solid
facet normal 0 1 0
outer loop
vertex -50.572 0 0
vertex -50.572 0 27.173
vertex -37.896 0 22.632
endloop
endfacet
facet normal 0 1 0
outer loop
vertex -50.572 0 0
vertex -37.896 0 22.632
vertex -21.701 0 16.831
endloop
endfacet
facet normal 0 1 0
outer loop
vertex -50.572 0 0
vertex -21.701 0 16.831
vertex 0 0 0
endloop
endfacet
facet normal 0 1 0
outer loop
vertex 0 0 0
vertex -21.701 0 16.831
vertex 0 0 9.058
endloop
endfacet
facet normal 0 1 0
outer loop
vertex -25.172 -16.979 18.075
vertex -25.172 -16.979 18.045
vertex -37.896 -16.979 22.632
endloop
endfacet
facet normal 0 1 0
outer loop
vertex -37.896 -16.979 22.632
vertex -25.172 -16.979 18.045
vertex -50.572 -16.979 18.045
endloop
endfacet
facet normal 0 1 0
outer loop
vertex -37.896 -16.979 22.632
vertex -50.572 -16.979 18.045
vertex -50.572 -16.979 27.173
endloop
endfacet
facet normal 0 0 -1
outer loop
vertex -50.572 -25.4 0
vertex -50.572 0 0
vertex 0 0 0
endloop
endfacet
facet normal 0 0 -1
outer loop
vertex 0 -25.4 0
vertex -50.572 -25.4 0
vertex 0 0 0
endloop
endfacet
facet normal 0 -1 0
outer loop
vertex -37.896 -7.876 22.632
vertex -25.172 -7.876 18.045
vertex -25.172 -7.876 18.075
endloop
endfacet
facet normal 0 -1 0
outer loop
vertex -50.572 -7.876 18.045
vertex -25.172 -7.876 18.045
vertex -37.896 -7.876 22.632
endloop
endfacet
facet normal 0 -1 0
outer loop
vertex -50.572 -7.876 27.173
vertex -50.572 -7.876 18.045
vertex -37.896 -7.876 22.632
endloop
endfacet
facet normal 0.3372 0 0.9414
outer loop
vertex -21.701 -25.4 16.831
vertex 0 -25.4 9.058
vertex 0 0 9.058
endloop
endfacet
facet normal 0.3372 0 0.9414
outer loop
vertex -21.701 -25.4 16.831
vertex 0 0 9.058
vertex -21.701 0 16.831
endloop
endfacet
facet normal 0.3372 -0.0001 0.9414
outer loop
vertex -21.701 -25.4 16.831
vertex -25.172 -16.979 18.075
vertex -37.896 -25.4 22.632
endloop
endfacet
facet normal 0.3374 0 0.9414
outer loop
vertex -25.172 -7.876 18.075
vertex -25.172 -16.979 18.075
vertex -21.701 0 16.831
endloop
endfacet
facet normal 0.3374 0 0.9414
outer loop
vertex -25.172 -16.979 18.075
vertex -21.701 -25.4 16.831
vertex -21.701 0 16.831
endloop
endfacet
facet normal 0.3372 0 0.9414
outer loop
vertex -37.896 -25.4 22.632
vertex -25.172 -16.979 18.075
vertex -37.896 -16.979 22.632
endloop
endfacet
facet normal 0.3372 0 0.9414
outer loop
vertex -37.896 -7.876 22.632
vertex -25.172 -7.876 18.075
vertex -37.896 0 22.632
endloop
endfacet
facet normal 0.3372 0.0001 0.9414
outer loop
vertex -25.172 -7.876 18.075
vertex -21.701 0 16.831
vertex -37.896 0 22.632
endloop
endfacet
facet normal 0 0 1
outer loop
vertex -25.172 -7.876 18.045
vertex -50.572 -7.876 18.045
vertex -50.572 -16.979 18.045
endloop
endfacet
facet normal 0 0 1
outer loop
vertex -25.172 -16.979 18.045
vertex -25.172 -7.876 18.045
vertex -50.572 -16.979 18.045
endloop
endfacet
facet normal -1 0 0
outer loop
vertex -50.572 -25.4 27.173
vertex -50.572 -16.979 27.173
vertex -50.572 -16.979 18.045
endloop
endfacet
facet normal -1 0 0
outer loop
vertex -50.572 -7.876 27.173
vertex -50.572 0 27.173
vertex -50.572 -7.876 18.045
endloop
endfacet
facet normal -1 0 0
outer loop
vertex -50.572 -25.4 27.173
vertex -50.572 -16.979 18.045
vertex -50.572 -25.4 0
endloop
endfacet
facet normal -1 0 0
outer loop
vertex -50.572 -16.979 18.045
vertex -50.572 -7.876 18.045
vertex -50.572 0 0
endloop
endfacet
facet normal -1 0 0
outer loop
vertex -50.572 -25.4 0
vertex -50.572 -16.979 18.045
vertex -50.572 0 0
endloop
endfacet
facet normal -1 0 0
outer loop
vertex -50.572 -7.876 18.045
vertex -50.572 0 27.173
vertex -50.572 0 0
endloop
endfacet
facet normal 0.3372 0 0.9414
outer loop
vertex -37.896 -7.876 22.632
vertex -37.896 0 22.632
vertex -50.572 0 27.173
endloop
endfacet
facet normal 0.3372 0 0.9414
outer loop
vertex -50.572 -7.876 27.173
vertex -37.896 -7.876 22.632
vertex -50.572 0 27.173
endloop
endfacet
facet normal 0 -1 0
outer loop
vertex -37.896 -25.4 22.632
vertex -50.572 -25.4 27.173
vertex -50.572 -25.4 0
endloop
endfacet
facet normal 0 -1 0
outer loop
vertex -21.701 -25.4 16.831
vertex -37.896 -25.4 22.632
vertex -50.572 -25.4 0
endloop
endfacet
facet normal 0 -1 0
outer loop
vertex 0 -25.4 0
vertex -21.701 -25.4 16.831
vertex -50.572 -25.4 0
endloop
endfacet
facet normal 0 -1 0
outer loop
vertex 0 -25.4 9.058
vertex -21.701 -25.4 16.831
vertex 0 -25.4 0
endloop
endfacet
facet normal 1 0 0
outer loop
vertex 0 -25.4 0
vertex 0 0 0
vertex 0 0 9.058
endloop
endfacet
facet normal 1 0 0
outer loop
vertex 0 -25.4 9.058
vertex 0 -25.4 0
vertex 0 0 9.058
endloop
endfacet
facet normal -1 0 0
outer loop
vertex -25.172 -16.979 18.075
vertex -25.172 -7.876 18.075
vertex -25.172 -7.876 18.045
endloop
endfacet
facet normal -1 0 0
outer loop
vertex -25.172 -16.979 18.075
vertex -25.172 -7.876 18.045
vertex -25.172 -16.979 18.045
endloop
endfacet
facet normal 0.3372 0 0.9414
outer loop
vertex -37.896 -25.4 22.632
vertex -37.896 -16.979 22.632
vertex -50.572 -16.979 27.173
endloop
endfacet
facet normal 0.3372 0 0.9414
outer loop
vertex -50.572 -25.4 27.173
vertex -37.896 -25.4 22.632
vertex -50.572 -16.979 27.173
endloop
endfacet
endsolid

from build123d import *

# Parameters (mm, degrees)
F1_DEPTH = 25.4
F2_W     = 9.1030672193
F2_H     = 9.1277305037
F3_DEPTH = 25.4


with BuildPart() as f1:
    # F0 (on Front) → F1 (new body)
    with BuildSketch(Plane.XZ):
        Polygon((-37.8958209513, 22.6323588295), (-50.5723580718, 27.1732080728), (-50.5723580718, 22.6323588295), align=None)
        Polygon((-37.8958209513, 22.6323588295), (-50.5723580718, 22.6323588295), (-50.5723580718, 9.0577360243), (-21.7006838323, 9.0577360243), (-21.7006838323, 16.8311155222), align=None)
        Polygon((-21.7006838323, 9.0577360243), (-50.5723580718, 9.0577360243), (-50.5723580718, 0), (0, 0), (0, 9.0577360243), align=None)
        Polygon((0, 9.0577360243), (-21.7006838323, 16.8311155222), (-21.7006838323, 9.0577360243), align=None)
    extrude(amount=F1_DEPTH)

    # F2 (on face) → F3 (cut)
    with BuildSketch(Plane(origin=(-50.5723580718, 0, 0), x_dir=(0, -1, 0), z_dir=(-1, 0, 0))):
        with Locations((12.4278347939, 22.6093428209)):
            Rectangle(F2_W, F2_H)
    extrude(amount=-F3_DEPTH, mode=Mode.SUBTRACT)


solid = f1.part
